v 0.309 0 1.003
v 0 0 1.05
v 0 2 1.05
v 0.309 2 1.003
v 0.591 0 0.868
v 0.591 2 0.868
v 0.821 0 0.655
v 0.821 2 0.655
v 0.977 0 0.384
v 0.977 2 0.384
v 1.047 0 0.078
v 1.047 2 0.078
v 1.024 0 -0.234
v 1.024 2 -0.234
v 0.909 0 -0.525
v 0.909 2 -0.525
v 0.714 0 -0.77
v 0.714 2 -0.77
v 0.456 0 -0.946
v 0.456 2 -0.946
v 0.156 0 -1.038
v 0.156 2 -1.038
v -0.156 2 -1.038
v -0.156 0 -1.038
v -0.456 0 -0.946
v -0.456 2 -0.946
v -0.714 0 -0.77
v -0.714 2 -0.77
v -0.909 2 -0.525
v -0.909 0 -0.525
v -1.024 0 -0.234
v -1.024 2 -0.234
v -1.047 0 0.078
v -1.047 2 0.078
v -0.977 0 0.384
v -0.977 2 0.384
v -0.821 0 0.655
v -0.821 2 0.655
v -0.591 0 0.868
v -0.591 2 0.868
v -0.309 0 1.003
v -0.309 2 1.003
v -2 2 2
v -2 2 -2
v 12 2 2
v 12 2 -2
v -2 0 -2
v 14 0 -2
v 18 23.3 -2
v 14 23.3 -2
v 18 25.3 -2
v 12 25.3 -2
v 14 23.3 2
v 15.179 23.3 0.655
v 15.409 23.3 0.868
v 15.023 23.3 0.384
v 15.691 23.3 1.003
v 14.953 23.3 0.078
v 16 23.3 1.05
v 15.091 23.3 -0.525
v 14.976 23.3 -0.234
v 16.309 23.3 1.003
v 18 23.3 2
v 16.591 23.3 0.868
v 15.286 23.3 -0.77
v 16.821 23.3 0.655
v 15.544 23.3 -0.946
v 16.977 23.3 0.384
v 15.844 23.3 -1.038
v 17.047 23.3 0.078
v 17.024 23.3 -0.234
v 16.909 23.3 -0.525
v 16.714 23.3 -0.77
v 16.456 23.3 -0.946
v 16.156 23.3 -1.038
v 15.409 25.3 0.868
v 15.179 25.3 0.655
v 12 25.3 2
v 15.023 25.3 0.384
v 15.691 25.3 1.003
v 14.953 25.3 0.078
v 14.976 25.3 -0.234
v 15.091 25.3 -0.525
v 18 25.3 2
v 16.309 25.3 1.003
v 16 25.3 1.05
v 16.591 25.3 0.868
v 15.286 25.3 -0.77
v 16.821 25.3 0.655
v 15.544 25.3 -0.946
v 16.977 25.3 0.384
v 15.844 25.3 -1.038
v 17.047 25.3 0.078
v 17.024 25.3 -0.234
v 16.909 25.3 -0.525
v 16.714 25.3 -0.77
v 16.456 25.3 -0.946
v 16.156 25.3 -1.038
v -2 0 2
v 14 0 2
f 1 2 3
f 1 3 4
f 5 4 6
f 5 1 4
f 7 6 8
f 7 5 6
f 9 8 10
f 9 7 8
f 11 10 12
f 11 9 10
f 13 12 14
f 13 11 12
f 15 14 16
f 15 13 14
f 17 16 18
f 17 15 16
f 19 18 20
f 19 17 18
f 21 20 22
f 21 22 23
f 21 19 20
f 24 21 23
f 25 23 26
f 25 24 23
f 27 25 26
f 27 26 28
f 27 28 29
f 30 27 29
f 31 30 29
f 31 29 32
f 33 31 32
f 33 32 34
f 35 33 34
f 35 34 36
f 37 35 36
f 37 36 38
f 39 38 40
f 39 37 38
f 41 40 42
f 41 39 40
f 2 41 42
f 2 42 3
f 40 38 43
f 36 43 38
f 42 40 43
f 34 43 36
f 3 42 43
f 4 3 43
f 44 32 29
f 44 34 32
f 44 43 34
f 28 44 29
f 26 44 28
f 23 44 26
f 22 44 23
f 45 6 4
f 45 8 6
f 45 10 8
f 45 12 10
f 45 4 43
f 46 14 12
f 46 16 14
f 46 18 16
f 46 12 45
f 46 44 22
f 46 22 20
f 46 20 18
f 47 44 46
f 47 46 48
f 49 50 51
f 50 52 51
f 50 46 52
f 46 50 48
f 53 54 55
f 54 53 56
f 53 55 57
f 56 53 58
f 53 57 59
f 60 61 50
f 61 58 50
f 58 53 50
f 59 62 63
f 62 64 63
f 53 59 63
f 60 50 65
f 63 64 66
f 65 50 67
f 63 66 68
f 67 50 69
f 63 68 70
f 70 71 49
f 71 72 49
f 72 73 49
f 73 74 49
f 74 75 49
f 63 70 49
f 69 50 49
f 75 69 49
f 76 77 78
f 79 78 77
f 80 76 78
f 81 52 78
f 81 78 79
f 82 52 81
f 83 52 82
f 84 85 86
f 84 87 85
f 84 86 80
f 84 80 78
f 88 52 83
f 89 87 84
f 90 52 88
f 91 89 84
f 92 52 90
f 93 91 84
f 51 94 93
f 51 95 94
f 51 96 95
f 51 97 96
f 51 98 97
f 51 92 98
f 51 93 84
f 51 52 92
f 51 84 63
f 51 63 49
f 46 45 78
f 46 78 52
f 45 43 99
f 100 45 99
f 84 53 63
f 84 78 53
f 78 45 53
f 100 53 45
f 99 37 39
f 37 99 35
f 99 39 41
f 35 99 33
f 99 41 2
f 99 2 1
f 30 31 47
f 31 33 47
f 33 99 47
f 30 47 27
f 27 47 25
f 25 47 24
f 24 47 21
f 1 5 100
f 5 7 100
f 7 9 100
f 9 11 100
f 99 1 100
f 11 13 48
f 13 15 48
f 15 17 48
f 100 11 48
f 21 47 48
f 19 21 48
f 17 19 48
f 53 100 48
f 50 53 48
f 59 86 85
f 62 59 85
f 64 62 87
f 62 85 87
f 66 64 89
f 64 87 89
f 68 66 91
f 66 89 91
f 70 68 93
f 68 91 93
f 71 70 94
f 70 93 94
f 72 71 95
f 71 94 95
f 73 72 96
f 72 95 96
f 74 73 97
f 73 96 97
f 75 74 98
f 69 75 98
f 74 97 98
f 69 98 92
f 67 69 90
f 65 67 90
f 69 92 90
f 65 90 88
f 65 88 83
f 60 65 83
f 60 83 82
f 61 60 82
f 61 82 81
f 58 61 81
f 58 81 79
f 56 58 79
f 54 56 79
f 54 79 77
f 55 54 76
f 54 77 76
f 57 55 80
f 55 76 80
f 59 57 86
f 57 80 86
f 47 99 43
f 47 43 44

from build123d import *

# Parameters (mm, degrees)
SKETCH1_W           = 14
SKETCH1_H           = 4
SKETCH1_R           = 1.05
BOSS_EXTRUDE1_DEPTH = 2
SKETCH2_W           = 2
SKETCH2_H           = 4
BOSS_EXTRUDE2_DEPTH = 25.3
SKETCH3_W           = 4
SKETCH3_H           = 4
SKETCH3_R           = 1.05
BOSS_EXTRUDE3_DEPTH = 2


with BuildPart() as part:
    # Sketch1 → Boss-Extrude1 (new body)
    with BuildSketch(Plane(origin=(0, 0, 0), x_dir=(1, 0, 0), z_dir=(0, 1, 0))):
        with Locations((5, 0)):
            Rectangle(SKETCH1_W, SKETCH1_H)
        with Locations(Location((0, 0, 0), (0, 0, 270))):
            Circle(SKETCH1_R, mode=Mode.SUBTRACT)
    extrude(amount=BOSS_EXTRUDE1_DEPTH)

    # Sketch2 → Boss-Extrude2 (add)
    with BuildSketch(Plane(origin=(0, 0, 0), x_dir=(1, 0, 0), z_dir=(0, 1, 0))):
        with Locations((13, 0)):
            Rectangle(SKETCH2_W, SKETCH2_H)
    extrude(amount=BOSS_EXTRUDE2_DEPTH)

    # Sketch3 → Boss-Extrude3 (add)
    with BuildSketch(Plane(origin=(0, 25.3, 0), x_dir=(1, 0, 0), z_dir=(0, 1, 0))):
        with Locations((16, 0)):
            Rectangle(SKETCH3_W, SKETCH3_H)
        with Locations(Location((16, 0, 0), (0, 0, 270))):
            Circle(SKETCH3_R, mode=Mode.SUBTRACT)
    extrude(amount=-BOSS_EXTRUDE3_DEPTH)


solid = part.part
